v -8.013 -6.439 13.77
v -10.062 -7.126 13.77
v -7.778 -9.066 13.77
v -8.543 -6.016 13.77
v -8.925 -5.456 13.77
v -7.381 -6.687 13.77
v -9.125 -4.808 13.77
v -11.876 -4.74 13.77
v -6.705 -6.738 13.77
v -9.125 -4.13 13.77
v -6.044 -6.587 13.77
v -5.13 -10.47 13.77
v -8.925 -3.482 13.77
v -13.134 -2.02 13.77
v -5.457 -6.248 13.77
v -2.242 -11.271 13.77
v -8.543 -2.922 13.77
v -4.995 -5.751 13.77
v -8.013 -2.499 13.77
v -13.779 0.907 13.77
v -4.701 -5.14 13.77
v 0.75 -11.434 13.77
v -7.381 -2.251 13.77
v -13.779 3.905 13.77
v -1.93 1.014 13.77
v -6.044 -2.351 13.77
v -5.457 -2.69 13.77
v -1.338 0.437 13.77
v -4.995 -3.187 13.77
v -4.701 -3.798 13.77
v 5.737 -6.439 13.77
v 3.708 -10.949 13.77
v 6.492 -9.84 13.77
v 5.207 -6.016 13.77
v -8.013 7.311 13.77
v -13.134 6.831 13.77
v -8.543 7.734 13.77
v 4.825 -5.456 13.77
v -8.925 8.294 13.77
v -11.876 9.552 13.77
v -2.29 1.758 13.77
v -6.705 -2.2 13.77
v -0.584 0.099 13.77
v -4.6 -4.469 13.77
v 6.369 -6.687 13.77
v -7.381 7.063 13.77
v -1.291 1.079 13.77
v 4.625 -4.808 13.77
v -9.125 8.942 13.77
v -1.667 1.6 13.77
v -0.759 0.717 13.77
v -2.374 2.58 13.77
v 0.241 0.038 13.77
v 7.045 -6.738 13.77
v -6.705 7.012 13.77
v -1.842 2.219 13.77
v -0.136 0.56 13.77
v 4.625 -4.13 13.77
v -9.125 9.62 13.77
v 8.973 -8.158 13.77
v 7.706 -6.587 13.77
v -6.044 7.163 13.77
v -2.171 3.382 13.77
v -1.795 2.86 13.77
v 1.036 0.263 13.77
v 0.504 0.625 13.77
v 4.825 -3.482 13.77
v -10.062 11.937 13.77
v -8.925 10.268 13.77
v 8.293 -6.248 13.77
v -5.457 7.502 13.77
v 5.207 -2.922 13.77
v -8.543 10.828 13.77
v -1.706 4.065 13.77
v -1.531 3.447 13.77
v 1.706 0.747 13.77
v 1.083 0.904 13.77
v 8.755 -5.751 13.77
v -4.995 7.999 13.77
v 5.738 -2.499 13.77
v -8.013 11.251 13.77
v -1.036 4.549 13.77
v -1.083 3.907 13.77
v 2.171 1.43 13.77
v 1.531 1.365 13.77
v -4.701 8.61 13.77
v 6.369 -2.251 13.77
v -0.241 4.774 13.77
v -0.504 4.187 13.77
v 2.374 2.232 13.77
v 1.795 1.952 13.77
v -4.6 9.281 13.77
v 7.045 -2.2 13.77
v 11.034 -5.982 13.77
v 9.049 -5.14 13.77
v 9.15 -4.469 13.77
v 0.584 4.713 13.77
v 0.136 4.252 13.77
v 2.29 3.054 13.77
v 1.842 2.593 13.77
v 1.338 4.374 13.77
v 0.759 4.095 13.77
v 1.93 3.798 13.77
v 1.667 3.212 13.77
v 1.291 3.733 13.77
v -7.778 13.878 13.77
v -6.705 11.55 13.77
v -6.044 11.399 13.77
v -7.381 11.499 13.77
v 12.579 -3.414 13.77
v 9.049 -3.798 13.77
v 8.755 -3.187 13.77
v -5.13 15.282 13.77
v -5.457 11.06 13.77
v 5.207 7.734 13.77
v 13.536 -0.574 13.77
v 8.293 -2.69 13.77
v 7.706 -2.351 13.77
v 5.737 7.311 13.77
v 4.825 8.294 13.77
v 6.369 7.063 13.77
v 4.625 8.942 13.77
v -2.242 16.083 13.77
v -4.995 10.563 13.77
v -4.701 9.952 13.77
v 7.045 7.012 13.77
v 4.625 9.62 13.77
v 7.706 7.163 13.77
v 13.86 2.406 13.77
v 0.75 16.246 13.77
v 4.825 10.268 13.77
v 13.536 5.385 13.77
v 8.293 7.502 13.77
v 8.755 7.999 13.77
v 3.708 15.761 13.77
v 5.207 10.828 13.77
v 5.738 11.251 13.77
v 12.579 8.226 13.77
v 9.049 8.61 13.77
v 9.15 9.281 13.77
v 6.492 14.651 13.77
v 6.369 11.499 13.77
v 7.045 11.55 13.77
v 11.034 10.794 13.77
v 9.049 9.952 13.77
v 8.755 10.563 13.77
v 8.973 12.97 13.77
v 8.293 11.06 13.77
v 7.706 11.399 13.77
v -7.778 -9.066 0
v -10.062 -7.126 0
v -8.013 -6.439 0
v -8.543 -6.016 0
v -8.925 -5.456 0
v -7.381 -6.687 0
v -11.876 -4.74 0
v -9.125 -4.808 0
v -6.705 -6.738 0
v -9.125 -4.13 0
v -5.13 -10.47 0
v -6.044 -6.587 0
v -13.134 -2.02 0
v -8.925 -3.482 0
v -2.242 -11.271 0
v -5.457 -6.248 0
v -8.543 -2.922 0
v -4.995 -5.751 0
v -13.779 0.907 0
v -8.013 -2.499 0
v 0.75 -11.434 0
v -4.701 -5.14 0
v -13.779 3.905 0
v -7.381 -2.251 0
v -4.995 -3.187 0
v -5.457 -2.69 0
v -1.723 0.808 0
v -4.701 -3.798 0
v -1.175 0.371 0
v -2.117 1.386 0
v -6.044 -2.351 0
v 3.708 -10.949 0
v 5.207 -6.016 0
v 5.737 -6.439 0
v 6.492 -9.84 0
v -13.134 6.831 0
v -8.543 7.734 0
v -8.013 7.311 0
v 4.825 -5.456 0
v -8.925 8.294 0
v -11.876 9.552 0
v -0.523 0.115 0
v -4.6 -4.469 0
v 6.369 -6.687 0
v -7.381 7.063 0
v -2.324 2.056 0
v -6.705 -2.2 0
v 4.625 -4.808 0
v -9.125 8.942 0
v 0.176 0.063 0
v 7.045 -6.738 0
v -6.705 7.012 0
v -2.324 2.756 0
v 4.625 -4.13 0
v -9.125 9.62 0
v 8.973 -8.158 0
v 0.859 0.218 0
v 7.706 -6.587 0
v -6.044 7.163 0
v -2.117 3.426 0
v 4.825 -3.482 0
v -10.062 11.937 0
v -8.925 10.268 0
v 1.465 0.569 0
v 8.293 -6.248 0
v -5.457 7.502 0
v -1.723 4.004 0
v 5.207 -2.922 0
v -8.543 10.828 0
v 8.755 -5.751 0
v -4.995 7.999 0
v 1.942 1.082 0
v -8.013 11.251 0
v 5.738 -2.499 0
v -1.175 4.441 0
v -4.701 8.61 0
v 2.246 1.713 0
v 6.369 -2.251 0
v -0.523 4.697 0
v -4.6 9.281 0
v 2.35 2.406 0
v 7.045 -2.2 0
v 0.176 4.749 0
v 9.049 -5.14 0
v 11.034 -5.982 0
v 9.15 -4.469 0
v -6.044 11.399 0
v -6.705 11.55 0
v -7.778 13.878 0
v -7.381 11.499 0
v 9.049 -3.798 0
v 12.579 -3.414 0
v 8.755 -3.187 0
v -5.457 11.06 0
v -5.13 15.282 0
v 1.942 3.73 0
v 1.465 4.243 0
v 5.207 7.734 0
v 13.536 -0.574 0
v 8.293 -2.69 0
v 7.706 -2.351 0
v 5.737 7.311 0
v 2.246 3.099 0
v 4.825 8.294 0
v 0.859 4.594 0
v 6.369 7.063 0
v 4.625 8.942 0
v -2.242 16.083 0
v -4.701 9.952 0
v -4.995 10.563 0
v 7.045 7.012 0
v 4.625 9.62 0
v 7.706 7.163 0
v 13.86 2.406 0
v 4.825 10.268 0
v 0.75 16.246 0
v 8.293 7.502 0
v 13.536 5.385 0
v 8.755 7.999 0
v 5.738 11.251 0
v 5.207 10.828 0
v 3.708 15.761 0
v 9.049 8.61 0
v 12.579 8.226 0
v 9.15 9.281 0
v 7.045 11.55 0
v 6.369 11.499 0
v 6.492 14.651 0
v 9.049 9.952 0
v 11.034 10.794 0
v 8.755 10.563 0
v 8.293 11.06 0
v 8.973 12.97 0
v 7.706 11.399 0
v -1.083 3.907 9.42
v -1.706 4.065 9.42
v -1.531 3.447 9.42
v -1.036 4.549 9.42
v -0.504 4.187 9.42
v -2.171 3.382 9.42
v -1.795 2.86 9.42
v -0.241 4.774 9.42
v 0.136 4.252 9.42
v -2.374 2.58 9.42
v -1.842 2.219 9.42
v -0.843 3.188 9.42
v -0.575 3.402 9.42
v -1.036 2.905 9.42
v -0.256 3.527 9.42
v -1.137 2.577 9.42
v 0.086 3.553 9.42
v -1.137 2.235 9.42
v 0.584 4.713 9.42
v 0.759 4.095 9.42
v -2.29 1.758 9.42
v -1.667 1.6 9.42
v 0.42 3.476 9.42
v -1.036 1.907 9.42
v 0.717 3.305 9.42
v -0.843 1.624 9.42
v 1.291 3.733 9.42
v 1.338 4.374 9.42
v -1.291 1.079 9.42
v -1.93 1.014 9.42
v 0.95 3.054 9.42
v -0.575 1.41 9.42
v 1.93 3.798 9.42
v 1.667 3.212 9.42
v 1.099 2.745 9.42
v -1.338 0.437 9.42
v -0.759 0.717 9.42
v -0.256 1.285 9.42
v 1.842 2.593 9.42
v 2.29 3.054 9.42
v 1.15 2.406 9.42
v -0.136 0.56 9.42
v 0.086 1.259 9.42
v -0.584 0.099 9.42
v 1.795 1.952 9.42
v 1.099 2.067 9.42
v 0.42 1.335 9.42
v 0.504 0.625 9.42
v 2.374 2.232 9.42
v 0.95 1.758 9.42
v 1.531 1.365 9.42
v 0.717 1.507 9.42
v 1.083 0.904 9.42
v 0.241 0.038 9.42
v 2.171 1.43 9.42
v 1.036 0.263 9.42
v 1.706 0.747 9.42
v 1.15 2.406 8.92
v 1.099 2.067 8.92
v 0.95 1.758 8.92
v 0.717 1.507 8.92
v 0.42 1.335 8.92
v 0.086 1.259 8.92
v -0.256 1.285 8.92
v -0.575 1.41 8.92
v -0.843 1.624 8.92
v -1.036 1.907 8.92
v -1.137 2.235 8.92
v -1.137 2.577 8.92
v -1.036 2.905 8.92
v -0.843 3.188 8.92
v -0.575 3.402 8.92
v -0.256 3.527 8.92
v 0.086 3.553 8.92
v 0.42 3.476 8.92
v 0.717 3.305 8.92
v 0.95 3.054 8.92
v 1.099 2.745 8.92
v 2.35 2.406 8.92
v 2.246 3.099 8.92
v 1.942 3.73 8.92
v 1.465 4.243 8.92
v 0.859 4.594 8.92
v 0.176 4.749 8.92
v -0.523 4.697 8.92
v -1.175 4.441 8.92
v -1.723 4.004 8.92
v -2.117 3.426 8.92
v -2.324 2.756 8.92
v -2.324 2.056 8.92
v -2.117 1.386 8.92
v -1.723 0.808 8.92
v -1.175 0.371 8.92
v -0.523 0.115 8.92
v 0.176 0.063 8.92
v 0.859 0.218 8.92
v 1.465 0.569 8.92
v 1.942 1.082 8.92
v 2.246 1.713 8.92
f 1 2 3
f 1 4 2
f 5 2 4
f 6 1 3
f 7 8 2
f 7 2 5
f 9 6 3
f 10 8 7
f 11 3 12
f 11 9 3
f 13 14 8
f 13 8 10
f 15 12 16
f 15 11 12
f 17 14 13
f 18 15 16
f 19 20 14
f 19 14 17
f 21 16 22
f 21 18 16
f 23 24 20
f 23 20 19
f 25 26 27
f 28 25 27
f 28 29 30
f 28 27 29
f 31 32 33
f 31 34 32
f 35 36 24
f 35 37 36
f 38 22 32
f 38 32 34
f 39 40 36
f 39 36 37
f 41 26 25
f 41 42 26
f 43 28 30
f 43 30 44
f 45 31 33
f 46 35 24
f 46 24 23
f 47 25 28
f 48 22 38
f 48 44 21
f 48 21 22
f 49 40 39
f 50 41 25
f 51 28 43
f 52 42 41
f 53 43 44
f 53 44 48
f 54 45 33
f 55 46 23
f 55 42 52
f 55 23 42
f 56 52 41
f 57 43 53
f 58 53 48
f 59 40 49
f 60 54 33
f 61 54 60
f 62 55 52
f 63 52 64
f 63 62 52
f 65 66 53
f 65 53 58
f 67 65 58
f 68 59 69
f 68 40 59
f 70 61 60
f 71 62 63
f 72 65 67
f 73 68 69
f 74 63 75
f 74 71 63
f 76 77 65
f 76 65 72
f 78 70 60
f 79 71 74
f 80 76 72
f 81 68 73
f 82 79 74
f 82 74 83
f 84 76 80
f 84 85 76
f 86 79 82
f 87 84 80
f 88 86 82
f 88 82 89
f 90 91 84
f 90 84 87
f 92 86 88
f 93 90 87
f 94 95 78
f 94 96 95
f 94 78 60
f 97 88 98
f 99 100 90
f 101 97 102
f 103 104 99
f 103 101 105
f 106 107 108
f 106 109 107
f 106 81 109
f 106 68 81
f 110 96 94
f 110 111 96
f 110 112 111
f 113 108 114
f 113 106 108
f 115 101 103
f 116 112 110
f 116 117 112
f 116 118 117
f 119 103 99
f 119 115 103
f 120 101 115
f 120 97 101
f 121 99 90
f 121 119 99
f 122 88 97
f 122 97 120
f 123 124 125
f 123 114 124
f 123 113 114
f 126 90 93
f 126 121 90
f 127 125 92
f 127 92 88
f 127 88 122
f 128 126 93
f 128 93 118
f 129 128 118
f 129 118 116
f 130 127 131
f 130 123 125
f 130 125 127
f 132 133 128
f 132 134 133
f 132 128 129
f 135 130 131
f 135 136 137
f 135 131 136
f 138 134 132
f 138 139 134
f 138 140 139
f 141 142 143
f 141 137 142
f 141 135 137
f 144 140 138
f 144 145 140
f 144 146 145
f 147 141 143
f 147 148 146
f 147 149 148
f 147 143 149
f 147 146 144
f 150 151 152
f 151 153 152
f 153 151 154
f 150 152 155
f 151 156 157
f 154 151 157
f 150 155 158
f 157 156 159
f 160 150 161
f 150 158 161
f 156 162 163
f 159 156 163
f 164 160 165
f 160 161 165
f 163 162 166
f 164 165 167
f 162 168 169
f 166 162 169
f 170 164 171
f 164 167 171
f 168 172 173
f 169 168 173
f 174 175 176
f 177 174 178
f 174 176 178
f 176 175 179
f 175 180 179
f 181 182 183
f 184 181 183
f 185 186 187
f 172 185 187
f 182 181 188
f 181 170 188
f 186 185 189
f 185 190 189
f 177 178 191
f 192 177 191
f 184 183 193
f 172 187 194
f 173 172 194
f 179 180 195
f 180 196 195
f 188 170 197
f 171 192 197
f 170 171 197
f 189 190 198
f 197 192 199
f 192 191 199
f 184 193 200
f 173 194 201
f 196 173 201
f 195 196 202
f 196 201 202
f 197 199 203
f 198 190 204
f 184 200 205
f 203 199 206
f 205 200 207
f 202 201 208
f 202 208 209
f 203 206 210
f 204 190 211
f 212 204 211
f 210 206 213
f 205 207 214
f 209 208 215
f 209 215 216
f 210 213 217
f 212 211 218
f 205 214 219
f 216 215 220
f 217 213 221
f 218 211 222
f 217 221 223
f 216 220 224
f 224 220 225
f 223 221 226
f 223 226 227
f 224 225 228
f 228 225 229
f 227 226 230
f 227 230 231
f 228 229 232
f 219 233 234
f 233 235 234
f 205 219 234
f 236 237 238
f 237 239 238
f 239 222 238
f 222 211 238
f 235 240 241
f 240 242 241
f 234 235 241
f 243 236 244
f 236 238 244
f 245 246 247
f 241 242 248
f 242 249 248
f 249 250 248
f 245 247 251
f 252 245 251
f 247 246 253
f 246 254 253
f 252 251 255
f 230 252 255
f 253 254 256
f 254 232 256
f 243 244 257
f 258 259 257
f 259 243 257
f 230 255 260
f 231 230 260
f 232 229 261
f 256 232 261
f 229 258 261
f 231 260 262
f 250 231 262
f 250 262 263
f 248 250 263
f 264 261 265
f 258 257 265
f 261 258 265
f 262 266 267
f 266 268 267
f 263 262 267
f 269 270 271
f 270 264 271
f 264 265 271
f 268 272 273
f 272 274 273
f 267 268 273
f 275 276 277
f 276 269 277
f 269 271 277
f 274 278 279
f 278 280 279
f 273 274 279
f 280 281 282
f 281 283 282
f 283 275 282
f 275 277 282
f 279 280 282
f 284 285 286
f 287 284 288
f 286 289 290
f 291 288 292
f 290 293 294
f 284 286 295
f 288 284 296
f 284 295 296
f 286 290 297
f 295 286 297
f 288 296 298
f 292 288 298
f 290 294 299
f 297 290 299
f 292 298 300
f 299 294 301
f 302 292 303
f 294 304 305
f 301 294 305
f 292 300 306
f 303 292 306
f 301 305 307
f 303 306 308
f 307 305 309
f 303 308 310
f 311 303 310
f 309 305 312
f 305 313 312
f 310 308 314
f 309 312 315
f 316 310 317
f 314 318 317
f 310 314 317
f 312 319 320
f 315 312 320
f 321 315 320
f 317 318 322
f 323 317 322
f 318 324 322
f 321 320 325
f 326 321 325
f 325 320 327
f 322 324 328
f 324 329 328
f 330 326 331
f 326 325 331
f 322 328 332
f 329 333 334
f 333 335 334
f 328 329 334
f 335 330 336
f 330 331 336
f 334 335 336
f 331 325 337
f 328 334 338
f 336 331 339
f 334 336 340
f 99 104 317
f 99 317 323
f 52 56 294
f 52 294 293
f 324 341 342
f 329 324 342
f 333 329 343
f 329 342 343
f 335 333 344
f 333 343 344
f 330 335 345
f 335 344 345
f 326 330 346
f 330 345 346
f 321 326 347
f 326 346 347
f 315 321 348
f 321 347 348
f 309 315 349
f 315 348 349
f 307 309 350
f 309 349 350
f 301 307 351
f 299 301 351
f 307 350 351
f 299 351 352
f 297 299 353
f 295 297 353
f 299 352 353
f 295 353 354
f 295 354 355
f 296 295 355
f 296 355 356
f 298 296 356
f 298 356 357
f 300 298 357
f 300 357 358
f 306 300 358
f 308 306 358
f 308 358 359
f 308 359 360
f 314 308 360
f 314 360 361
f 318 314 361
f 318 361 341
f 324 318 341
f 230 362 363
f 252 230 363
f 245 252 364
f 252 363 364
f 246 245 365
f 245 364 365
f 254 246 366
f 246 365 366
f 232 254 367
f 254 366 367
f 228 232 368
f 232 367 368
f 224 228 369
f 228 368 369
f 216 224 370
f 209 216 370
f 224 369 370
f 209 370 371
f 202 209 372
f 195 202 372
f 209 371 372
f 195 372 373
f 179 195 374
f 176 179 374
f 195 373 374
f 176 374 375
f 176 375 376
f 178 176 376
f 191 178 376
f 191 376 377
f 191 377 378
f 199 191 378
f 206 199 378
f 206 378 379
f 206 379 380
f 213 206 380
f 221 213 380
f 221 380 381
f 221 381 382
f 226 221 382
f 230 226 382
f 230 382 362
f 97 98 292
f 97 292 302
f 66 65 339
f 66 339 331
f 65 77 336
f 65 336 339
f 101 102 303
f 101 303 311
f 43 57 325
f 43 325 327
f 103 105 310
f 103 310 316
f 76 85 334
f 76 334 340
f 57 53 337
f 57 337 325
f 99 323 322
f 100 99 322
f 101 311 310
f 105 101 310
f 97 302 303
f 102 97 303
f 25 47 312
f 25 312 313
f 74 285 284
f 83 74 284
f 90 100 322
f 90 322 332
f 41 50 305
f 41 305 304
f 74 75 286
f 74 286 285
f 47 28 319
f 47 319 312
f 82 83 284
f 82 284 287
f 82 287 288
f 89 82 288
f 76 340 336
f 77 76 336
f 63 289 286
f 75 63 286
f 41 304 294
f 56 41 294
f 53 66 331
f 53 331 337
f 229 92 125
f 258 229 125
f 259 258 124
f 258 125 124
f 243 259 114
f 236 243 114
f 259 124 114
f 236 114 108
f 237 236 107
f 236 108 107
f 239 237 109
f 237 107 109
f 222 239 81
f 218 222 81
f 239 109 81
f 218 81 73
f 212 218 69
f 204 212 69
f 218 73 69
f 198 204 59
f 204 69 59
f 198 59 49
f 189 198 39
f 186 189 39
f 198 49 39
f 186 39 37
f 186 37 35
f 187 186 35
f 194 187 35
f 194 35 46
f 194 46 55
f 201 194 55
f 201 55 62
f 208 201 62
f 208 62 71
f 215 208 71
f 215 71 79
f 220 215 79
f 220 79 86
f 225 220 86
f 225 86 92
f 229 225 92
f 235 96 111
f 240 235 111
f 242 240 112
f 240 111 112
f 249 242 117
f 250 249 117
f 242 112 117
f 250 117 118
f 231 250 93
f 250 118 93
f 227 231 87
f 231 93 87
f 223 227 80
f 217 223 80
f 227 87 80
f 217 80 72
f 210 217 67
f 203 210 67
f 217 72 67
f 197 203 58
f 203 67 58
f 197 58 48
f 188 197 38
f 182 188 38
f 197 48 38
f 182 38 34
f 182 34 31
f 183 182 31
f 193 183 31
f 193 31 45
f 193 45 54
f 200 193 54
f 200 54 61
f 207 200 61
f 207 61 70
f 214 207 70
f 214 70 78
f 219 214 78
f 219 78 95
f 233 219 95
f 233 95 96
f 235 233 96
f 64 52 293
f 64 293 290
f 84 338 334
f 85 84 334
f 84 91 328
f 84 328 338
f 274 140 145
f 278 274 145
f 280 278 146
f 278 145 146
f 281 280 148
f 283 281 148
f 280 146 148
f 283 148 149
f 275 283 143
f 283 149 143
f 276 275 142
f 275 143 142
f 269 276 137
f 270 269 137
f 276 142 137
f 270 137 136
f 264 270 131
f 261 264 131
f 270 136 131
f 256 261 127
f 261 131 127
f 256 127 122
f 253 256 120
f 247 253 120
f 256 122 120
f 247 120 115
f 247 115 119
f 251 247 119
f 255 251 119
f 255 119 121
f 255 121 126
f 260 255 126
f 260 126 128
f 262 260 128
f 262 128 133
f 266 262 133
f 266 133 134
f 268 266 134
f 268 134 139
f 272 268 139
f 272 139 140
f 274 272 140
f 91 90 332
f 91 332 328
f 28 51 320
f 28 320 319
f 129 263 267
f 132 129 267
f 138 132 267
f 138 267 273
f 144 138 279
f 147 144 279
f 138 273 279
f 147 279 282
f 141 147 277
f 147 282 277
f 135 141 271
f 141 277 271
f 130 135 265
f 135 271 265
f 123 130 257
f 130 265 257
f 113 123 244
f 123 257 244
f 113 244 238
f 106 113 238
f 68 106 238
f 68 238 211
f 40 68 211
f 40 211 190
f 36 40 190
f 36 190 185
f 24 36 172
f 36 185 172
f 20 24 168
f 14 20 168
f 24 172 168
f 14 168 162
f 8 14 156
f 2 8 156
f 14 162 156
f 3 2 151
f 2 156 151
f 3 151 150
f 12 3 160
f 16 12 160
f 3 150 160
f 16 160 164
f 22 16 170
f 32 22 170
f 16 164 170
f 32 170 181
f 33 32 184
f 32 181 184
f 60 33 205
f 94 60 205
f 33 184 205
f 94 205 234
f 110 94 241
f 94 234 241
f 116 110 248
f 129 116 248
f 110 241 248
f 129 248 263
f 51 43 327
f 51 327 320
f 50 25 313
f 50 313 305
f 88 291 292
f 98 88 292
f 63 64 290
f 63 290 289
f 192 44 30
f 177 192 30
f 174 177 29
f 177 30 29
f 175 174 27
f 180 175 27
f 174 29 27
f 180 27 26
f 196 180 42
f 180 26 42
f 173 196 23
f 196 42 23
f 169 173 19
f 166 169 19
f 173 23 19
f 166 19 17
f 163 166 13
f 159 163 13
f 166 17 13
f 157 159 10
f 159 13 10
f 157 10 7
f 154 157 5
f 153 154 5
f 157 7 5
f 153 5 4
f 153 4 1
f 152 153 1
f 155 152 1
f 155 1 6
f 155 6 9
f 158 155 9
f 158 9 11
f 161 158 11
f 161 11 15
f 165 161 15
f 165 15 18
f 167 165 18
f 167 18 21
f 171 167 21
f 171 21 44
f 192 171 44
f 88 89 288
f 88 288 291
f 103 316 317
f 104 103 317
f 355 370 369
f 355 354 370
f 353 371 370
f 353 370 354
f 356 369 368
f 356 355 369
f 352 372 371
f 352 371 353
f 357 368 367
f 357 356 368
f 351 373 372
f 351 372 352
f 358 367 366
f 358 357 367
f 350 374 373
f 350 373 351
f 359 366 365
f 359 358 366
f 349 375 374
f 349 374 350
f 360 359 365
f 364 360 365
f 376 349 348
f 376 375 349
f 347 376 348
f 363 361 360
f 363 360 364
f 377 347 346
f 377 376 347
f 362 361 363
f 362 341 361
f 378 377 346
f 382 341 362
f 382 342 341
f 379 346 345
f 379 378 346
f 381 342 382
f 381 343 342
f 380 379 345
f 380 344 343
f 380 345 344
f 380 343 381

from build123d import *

# Parameters (mm, degrees)
F0_R      = 13.86
F1_DEPTH  = 13.77
F2_R      = 2.35
F2_R_2    = 2.275
F3_DEPTH  = 25
F4_R      = 2.35
F5_DEPTH  = 6.9
F7_R      = 2.38
F8_DEPTH  = 4.35
F9_DEPTH  = 5
F10_R     = 1.15
F11_DEPTH = 25
F12_R     = 2.35
F13_DEPTH = 25
F14_R     = 2.35
F15_DEPTH = 0.5
F16_R     = 1.15
F17_DEPTH = 25


with BuildPart() as f1:
    # F0 (on Top) → F1 (new body)
    with BuildSketch(Plane.XY):
        with Locations((0, 2.4059718373)):
            Circle(F0_R)
    extrude(amount=F1_DEPTH)

    # F2 (on face) → F3 (cut)
    with BuildSketch(Plane.XY.offset(13.77)):
        with Locations((0, 2.4059718373)):
            Circle(F2_R)
        with Locations((6.875, 9.2809718373)):
            Circle(F2_R_2)
        with Locations((-6.875, 9.2809718373)):
            Circle(F2_R_2)
        with Locations((-6.875, -4.4690281627)):
            Circle(F2_R_2)
        with Locations((6.875, -4.4690281627)):
            Circle(F2_R_2)
    extrude(amount=-F3_DEPTH, mode=Mode.SUBTRACT)

    # F4 (on face) → F5 (join)
    with BuildSketch(Plane.XY.offset(13.77)):
        with Locations((0, 2.4059718373)):
            Circle(F4_R)
    extrude(amount=-F5_DEPTH)

    # F7 (on face) → F8 (cut)
    with BuildSketch(Plane.XY.offset(13.77)):
        with Locations((0, 2.4059718373)):
            Circle(F7_R)
    extrude(amount=-F8_DEPTH, mode=Mode.SUBTRACT)

    # F6 (on face) → F9 (join)
    with BuildSketch(Plane.XY.offset(13.77)):
        with BuildLine():
            Line((1.2906450855, 3.7332204924), (1.9303061005, 3.7982068599))
            ThreePointArc((1.9303061005, 3.7982068599), (1.6592213389, 4.1122498183), (1.3377219765, 4.3744483836))
            Line((1.3377219765, 4.3744483836), (1.2906450855, 3.7332204924))
        make_face()
        with BuildLine():
            Line((1.6667554382, 3.2117509874), (2.2900668205, 3.0540412453))
            ThreePointArc((2.2900668205, 3.0540412453), (2.142739488, 3.4418615449), (1.9303061005, 3.7982068599))
            Line((1.9303061005, 3.7982068599), (1.6667554382, 3.2117509874))
        make_face()
        with BuildLine():
            ThreePointArc((2.3736116842, 2.2317088956), (2.3784023848, 2.3187818387), (2.38, 2.4059718373))
            ThreePointArc((2.38, 2.4059718373), (2.3574094927, 2.7331116906), (2.2900668205, 3.0540412453))
            Line((2.2900668205, 3.0540412453), (1.8418304863, 2.5930926248))
            Line((1.8418304863, 2.5930926248), (2.3736116842, 2.2317088956))
        make_face()
        with BuildLine():
            ThreePointArc((2.1708639479, 1.4303952285), (2.3072907469, 1.8221829978), (2.3736116842, 2.2317088956))
            Line((2.3736116842, 2.2317088956), (1.7947535953, 1.9518647336))
            Line((1.7947535953, 1.9518647336), (2.1708639479, 1.4303952285))
        make_face()
        with BuildLine():
            ThreePointArc((1.706277981, 0.7467504984), (1.9684765464, 1.0682498608), (2.1708639479, 1.4303952285))
            Line((2.1708639479, 1.4303952285), (1.5312029329, 1.365408861))
            Line((1.5312029329, 1.365408861), (1.706277981, 0.7467504984))
        make_face()
        with BuildLine():
            ThreePointArc((1.0358897076, 0.2632323492), (1.3922350227, 0.4756657368), (1.706277981, 0.7467504984))
            Line((1.706277981, 0.7467504984), (1.0829665987, 0.9044602404))
            Line((1.0829665987, 0.9044602404), (1.0358897076, 0.2632323492))
        make_face()
        with BuildLine():
            ThreePointArc((0.2405578474, 0.0381602058), (0.648069408, 0.1159050168), (1.0358897076, 0.2632323492))
            Line((1.0358897076, 0.2632323492), (0.5041085098, 0.6246160784))
            Line((0.5041085098, 0.6246160784), (0.2405578474, 0.0381602058))
        make_face()
        with BuildLine():
            ThreePointArc((-0.5837888395, 0.0986810903), (-0.1742629417, 0.0323601531), (0.2405578474, 0.0381602058))
            Line((0.2405578474, 0.0381602058), (-0.1355525053, 0.5596297109))
            Line((-0.1355525053, 0.5596297109), (-0.5837888395, 0.0986810903))
        make_face()
        with BuildLine():
            ThreePointArc((-1.3377219765, 0.4374952909), (-0.9755766088, 0.2351078894), (-0.5837888395, 0.0986810903))
            Line((-0.5837888395, 0.0986810903), (-0.7588638876, 0.717339453))
            Line((-0.7588638876, 0.717339453), (-1.3377219765, 0.4374952909))
        make_face()
        with BuildLine():
            ThreePointArc((-1.9303061005, 1.0137368146), (-1.6592213389, 0.6996938563), (-1.3377219765, 0.4374952909))
            Line((-1.3377219765, 0.4374952909), (-1.2906450855, 1.0787231821))
            Line((-1.2906450855, 1.0787231821), (-1.9303061005, 1.0137368146))
        make_face()
        with BuildLine():
            ThreePointArc((-2.2900668205, 1.7579024293), (-2.142739488, 1.3700821296), (-1.9303061005, 1.0137368146))
            Line((-1.9303061005, 1.0137368146), (-1.6667554382, 1.6001926872))
            Line((-1.6667554382, 1.6001926872), (-2.2900668205, 1.7579024293))
        make_face()
        with BuildLine():
            Line((-1.8418304863, 2.2188510498), (-2.3736116842, 2.580234779))
            ThreePointArc((-2.3736116842, 2.580234779), (-2.3678116315, 2.1654139899), (-2.2900668205, 1.7579024293))
            Line((-2.2900668205, 1.7579024293), (-1.8418304863, 2.2188510498))
        make_face()
        with BuildLine():
            Line((-1.7947535953, 2.860078941), (-2.1708639479, 3.3815484461))
            ThreePointArc((-2.1708639479, 3.3815484461), (-2.3072907469, 2.9897606768), (-2.3736116842, 2.580234779))
            Line((-2.3736116842, 2.580234779), (-1.7947535953, 2.860078941))
        make_face()
        with BuildLine():
            Line((-1.5312029329, 3.4465348136), (-1.706277981, 4.0651931762))
            ThreePointArc((-1.706277981, 4.0651931762), (-1.9684765464, 3.7436938138), (-2.1708639479, 3.3815484461))
            Line((-2.1708639479, 3.3815484461), (-1.5312029329, 3.4465348136))
        make_face()
        with BuildLine():
            Line((-1.0829665987, 3.9074834341), (-1.0358897076, 4.5487113253))
            ThreePointArc((-1.0358897076, 4.5487113253), (-1.3922350227, 4.3362779378), (-1.706277981, 4.0651931762))
            Line((-1.706277981, 4.0651931762), (-1.0829665987, 3.9074834341))
        make_face()
        with BuildLine():
            Line((-0.5041085098, 4.1873275962), (-0.2405578474, 4.7737834687))
            ThreePointArc((-0.2405578474, 4.7737834687), (-0.648069408, 4.6960386578), (-1.0358897076, 4.5487113253))
            Line((-1.0358897076, 4.5487113253), (-0.5041085098, 4.1873275962))
        make_face()
        with BuildLine():
            Line((0.1355525053, 4.2523139637), (0.5837888395, 4.7132625842))
            ThreePointArc((0.5837888395, 4.7132625842), (0.1742629417, 4.7795835214), (-0.2405578474, 4.7737834687))
            Line((-0.2405578474, 4.7737834687), (0.1355525053, 4.2523139637))
        make_face()
        with BuildLine():
            Line((0.7588638876, 4.0946042216), (1.3377219765, 4.3744483836))
            ThreePointArc((1.3377219765, 4.3744483836), (0.9755766088, 4.5768357852), (0.5837888395, 4.7132625842))
            Line((0.5837888395, 4.7132625842), (0.7588638876, 4.0946042216))
        make_face()
    extrude(amount=-F9_DEPTH)

    # F10 (on face) → F11 (cut)
    with BuildSketch(Plane(origin=(0, 0, 6.87), x_dir=(1, 0, 0), z_dir=(0, 0, -1))):
        with Locations((0, -2.4059718373)):
            Circle(F10_R)
    extrude(amount=-F11_DEPTH, mode=Mode.SUBTRACT)

    # F12 (on face) → F13 (cut)
    with BuildSketch(Plane.XY.offset(9.42)):
        with Locations((0, 2.4059718373)):
            Circle(F12_R)
    extrude(amount=-F13_DEPTH, mode=Mode.SUBTRACT)

    # F14 (on face) → F15 (join)
    with BuildSketch(Plane(origin=(0, 0, 9.42), x_dir=(1, 0, 0), z_dir=(0, 0, -1))):
        with Locations((0, -2.4059718373)):
            Circle(F14_R)
    extrude(amount=F15_DEPTH)

    # F16 (on face) → F17 (cut)
    with BuildSketch(Plane(origin=(0, 0, 8.92), x_dir=(1, 0, 0), z_dir=(0, 0, -1))):
        with Locations((0, -2.4059718373)):
            Circle(F16_R)
    extrude(amount=-F17_DEPTH, mode=Mode.SUBTRACT)


solid = f1.part
